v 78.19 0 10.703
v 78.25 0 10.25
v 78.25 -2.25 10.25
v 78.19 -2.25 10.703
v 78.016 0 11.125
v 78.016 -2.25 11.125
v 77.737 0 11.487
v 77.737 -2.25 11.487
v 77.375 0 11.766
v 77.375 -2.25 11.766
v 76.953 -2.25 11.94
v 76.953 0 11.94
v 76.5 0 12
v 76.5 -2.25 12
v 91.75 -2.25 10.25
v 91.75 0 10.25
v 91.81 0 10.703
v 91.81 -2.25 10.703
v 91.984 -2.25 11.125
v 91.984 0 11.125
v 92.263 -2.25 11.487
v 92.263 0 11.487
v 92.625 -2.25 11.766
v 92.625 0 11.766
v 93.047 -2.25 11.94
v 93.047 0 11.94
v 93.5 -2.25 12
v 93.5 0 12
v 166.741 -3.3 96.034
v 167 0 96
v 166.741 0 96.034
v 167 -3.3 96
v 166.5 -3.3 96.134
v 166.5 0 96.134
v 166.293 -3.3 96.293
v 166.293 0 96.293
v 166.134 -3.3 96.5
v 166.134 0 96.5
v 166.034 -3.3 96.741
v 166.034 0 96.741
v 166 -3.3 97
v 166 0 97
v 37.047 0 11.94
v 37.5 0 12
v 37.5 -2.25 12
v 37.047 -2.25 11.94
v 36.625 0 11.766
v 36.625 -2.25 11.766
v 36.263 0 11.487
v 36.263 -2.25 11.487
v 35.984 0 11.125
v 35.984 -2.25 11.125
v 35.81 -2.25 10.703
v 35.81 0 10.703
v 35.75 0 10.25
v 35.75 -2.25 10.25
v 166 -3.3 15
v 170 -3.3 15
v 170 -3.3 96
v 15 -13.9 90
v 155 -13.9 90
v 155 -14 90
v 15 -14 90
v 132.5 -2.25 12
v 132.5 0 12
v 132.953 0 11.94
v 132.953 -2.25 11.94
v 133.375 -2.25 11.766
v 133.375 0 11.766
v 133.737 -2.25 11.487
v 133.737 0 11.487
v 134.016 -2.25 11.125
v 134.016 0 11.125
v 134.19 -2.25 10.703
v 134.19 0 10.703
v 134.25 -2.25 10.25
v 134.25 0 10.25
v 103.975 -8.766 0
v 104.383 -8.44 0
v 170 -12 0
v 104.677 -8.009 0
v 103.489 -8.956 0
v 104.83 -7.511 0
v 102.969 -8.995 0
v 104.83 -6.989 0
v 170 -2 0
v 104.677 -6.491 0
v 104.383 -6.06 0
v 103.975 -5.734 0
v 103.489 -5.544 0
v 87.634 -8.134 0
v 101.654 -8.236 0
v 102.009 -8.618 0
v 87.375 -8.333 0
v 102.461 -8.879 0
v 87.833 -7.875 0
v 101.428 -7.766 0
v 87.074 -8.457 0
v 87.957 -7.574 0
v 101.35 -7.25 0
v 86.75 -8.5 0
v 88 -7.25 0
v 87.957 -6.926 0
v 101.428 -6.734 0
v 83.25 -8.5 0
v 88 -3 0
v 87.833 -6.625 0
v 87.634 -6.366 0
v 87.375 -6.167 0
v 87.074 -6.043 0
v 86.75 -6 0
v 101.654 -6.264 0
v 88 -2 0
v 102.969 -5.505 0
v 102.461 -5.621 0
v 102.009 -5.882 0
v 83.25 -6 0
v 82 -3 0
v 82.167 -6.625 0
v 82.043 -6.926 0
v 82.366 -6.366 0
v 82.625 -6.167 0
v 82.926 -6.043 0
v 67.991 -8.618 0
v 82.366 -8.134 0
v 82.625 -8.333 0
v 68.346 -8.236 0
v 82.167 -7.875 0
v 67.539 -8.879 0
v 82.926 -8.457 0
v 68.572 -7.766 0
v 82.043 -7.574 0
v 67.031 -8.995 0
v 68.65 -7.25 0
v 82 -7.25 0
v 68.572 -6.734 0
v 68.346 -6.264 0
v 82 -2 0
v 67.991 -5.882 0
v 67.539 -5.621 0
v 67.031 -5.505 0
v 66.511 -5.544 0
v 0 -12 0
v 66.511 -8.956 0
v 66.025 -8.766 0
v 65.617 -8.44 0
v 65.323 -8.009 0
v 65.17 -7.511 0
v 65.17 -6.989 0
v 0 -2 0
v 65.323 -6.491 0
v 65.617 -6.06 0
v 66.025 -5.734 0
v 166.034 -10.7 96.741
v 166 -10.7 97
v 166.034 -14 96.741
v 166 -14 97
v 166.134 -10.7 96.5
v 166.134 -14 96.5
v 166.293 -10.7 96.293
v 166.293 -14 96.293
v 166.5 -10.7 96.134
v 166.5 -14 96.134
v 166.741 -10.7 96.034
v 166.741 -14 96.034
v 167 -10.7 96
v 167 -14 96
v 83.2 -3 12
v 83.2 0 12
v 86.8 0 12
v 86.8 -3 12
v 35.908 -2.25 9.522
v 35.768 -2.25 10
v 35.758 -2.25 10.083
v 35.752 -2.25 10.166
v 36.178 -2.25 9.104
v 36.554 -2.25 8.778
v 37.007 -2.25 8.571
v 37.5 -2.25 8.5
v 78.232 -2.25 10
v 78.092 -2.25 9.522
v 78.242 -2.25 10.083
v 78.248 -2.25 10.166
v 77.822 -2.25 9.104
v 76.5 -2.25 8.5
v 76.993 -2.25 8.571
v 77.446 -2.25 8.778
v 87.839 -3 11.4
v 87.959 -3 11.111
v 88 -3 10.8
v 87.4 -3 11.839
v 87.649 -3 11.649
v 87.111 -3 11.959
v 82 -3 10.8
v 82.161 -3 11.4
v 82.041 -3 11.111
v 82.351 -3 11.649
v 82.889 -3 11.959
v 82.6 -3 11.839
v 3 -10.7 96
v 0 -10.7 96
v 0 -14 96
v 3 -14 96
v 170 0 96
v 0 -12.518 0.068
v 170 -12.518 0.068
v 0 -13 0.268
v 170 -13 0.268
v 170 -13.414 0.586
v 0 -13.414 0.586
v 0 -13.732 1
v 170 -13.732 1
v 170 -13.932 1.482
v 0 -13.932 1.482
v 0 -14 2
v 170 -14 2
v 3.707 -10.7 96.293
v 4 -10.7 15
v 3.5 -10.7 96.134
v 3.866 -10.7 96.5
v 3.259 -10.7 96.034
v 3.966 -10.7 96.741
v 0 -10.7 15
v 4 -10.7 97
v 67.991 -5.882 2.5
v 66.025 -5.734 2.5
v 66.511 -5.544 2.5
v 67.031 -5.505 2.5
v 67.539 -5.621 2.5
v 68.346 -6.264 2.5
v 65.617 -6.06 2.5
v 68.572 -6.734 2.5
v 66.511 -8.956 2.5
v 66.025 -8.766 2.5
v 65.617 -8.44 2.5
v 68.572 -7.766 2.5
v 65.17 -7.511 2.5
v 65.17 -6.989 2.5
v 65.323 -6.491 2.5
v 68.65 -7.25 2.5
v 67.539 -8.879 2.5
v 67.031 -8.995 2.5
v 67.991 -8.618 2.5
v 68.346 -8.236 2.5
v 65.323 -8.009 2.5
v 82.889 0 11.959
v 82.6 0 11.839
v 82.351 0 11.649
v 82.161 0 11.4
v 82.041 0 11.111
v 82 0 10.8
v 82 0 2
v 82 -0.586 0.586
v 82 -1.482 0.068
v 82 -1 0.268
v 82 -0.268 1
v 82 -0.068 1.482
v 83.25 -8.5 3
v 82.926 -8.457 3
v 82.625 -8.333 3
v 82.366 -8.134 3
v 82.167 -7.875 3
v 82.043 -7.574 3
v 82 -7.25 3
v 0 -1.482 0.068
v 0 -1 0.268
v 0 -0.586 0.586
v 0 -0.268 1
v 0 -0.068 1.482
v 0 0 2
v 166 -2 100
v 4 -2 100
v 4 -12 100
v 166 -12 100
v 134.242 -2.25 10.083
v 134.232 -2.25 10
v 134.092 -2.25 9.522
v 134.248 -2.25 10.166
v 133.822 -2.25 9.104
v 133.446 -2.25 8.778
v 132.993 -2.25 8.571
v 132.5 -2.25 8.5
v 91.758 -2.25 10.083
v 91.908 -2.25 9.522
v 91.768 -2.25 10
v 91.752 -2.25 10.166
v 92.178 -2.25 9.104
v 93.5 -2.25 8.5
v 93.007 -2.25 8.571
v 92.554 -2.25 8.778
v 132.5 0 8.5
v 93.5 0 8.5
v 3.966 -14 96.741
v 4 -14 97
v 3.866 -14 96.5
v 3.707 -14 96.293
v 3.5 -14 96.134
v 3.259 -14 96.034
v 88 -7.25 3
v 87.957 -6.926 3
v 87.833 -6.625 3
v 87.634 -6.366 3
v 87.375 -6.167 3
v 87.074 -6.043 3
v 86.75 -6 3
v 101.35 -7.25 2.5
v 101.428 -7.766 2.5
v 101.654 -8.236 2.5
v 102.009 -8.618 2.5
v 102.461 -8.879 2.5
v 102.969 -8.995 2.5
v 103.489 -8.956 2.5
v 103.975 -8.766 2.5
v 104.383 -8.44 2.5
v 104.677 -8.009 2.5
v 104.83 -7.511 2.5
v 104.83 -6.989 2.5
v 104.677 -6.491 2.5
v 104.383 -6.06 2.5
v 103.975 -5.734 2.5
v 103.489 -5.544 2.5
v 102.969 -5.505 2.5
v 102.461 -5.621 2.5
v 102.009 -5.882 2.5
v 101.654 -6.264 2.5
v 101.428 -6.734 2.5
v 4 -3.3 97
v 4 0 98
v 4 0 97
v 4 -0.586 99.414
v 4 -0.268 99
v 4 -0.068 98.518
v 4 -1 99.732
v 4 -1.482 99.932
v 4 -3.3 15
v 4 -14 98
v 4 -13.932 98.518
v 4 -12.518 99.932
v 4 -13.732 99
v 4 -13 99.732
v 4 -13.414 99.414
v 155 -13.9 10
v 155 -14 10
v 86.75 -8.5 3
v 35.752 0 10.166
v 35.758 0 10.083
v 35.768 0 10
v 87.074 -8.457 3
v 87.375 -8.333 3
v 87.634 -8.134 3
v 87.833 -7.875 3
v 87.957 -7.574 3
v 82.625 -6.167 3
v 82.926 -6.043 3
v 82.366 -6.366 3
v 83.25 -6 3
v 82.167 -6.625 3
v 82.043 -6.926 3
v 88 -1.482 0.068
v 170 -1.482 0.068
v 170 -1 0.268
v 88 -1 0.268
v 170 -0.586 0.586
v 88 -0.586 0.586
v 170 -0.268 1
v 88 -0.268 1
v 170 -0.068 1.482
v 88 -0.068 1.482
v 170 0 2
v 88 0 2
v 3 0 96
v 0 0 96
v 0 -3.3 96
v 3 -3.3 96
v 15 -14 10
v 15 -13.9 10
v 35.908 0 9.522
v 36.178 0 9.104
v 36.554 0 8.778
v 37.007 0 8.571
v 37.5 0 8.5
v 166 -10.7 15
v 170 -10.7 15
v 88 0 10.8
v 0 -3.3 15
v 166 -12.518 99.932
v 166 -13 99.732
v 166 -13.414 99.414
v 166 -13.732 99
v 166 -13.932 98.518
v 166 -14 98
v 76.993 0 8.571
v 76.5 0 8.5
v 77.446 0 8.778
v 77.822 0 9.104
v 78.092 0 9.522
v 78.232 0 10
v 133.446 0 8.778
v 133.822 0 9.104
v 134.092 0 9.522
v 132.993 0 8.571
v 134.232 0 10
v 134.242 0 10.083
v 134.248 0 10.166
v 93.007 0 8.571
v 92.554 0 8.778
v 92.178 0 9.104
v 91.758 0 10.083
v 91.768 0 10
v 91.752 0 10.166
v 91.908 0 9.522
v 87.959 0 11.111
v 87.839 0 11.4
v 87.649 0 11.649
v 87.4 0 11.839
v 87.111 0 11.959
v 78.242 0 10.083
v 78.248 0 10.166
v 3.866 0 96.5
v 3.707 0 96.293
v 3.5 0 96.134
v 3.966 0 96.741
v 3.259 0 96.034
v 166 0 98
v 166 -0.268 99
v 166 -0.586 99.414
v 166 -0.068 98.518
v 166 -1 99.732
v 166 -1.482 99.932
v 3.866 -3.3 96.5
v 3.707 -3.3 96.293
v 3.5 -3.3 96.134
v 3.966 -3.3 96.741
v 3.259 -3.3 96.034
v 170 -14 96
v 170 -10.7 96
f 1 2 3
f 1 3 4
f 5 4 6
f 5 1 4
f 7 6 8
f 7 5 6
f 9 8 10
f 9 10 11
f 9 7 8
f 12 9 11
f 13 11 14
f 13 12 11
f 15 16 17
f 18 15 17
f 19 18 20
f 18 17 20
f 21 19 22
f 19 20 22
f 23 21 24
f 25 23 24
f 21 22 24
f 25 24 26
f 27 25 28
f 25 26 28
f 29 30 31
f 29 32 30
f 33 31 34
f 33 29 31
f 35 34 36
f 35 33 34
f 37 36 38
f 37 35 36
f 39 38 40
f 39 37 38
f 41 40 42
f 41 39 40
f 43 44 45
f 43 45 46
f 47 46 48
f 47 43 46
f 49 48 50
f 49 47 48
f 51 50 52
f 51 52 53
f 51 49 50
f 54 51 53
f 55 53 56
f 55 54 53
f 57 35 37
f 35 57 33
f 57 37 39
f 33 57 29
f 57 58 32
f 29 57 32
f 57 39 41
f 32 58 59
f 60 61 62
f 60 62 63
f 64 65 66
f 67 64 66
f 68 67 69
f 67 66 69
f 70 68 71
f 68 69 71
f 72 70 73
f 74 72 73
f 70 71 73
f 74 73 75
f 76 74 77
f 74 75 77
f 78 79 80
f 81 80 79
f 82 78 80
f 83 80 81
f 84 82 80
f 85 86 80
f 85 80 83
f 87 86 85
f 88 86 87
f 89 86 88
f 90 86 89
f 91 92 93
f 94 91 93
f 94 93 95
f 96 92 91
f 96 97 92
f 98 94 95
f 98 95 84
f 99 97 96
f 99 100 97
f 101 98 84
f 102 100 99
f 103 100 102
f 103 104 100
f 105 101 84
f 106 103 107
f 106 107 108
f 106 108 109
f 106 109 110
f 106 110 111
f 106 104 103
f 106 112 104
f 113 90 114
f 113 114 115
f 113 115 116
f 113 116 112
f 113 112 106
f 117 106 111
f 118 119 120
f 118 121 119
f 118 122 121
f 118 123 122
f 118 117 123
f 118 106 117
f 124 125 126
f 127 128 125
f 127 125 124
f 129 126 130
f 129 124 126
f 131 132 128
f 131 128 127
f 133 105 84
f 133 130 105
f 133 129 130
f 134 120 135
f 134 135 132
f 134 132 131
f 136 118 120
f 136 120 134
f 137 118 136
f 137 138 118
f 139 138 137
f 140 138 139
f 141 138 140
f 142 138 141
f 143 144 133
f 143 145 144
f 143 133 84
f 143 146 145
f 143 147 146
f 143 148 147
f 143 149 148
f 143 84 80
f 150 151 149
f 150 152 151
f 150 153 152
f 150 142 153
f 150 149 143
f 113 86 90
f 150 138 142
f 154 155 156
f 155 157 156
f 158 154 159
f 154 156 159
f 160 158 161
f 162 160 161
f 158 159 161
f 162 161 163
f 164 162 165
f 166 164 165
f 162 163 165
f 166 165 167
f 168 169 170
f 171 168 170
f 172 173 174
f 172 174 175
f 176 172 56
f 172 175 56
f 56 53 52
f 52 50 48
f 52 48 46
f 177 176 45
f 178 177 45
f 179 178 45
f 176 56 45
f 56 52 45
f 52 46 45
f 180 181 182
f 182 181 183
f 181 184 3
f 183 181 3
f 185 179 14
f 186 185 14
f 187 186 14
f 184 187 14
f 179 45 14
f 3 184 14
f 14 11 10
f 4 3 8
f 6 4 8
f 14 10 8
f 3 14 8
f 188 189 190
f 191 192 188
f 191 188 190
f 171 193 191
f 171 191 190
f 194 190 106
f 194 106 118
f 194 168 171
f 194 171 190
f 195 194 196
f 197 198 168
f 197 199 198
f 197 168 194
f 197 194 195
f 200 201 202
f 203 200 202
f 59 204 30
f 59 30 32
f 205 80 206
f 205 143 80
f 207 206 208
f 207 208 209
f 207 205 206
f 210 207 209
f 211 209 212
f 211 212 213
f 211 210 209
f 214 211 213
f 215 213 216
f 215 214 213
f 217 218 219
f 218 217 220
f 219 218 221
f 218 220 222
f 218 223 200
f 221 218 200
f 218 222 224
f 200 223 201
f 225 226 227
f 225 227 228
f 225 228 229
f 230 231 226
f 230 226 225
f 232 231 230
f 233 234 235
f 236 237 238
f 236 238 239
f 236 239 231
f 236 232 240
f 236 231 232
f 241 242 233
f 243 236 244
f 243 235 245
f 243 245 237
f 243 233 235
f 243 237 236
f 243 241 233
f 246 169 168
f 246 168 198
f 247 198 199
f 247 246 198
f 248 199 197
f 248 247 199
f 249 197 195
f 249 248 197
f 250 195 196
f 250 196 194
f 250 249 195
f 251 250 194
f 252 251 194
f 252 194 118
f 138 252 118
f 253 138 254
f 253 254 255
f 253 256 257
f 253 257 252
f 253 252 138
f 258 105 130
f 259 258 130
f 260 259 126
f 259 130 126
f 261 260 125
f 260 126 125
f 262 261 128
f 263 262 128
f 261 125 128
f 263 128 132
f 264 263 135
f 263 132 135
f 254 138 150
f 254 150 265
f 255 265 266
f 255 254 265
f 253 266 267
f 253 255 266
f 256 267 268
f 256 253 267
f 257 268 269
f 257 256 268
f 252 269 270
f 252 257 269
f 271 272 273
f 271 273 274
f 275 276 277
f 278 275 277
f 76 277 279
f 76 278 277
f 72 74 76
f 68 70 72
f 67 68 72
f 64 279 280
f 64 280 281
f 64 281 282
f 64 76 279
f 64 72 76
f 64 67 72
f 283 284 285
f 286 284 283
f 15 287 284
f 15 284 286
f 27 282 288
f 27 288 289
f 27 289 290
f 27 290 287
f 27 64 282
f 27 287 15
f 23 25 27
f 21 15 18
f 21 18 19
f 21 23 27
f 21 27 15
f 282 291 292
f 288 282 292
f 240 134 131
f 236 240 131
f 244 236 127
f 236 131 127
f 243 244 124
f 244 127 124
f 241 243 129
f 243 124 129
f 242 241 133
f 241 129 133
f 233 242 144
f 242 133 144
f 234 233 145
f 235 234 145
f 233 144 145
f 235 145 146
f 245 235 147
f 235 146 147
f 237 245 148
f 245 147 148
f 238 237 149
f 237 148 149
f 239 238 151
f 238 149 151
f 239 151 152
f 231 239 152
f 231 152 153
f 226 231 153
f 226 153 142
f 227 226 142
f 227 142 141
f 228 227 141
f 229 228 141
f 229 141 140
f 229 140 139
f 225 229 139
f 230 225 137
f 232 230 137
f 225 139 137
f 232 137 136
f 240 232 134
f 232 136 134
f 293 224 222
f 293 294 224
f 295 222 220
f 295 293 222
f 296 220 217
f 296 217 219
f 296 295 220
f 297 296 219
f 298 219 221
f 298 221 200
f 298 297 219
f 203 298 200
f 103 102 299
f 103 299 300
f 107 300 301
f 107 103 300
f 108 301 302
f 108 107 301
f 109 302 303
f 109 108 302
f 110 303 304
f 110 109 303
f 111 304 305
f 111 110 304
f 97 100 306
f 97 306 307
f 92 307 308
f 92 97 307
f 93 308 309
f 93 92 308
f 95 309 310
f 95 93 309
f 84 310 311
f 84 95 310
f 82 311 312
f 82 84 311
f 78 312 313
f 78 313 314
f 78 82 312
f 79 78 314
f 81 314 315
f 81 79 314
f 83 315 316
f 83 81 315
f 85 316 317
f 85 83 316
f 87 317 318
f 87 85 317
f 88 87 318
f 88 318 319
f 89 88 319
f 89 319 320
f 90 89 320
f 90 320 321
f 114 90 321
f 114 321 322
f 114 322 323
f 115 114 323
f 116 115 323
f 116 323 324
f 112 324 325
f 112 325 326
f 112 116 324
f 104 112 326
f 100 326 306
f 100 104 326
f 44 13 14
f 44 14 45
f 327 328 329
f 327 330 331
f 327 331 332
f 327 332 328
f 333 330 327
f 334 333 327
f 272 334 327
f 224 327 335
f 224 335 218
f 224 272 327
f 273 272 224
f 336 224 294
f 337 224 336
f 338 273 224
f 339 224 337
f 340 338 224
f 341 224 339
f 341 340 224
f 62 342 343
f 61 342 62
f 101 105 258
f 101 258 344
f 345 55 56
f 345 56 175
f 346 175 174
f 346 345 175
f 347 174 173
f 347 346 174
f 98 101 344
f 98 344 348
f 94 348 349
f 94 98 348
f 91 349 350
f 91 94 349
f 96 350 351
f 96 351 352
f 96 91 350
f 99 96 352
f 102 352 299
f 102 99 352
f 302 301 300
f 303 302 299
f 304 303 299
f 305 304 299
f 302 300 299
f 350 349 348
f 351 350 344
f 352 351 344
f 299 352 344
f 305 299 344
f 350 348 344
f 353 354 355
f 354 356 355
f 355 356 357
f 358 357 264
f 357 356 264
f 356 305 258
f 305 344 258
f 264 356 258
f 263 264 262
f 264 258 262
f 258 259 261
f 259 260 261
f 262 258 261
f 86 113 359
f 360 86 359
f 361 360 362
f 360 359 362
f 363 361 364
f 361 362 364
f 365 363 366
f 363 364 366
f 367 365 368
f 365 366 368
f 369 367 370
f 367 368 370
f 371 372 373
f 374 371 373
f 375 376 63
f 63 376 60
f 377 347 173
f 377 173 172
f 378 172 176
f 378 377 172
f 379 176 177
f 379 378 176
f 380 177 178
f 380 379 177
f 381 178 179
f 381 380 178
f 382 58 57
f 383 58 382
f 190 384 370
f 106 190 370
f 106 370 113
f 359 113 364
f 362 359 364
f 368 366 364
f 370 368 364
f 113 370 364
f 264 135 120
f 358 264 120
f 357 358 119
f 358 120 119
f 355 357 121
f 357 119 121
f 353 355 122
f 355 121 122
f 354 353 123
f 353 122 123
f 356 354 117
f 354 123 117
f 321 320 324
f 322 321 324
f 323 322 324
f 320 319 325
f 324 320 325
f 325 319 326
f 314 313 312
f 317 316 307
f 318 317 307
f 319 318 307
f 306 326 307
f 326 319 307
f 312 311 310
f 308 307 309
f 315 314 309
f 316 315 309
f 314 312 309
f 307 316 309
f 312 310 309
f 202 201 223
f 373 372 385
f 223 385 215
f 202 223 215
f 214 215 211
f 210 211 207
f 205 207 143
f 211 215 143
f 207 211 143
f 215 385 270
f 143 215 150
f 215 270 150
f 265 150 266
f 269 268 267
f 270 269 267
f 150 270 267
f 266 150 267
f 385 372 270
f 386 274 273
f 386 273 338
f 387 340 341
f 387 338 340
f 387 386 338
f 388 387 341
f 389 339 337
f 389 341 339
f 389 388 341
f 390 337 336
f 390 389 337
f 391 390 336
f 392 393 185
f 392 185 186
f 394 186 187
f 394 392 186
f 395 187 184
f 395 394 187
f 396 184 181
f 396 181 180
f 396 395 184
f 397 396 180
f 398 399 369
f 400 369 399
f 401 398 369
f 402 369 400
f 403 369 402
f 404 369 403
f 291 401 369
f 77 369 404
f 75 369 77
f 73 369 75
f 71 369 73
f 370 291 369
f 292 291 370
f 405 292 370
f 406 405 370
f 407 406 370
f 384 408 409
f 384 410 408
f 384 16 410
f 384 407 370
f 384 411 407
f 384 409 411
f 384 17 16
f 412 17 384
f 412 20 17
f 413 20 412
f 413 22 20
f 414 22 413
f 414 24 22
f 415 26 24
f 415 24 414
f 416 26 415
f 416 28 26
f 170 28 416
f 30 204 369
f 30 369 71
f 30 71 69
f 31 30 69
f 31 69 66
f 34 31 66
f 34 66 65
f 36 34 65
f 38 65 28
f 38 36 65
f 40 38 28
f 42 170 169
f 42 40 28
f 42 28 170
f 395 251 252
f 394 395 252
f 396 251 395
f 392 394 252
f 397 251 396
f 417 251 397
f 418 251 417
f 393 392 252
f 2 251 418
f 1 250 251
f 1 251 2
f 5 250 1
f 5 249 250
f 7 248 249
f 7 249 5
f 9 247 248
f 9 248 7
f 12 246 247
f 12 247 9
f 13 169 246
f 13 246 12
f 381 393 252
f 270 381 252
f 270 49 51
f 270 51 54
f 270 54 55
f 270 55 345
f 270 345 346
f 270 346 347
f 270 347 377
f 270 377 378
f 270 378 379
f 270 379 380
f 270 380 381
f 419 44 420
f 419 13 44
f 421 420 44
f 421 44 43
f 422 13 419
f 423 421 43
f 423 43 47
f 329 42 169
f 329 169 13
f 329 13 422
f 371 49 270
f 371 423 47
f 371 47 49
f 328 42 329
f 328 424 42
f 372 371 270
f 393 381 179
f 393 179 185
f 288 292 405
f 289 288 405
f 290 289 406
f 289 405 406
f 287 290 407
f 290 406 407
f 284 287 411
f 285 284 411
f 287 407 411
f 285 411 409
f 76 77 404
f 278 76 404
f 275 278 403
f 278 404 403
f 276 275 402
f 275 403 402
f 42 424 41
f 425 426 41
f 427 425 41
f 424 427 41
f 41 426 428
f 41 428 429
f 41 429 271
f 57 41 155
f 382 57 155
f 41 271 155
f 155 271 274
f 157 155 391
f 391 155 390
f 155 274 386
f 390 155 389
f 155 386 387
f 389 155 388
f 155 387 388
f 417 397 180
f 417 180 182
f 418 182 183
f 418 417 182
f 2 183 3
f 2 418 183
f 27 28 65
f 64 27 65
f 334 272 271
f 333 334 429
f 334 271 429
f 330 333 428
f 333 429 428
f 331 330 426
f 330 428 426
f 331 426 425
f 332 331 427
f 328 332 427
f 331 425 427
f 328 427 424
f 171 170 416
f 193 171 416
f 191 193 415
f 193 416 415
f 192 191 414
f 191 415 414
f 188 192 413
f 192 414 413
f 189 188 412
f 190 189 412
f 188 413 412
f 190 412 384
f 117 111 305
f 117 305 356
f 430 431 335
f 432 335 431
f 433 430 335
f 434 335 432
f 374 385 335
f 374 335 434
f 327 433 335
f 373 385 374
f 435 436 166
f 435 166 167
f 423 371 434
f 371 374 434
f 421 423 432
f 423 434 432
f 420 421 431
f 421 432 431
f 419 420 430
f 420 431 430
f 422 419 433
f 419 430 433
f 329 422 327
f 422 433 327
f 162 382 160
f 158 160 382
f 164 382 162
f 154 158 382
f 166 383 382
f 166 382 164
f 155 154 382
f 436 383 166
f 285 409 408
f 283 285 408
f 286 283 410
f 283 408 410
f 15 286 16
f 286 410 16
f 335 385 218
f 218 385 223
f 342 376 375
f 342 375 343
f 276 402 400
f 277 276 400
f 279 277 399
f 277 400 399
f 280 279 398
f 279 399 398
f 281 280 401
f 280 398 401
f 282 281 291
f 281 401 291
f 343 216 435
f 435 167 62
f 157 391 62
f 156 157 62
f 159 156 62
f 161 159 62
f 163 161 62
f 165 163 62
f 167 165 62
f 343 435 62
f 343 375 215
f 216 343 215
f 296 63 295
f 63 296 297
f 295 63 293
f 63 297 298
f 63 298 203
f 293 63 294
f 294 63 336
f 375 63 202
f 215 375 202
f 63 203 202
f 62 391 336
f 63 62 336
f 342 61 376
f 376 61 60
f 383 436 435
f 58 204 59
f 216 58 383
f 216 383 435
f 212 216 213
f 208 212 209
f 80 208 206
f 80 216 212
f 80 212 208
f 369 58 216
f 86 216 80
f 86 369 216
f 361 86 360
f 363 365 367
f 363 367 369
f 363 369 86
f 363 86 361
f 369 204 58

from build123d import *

# Parameters (mm, degrees)
F1_DEPTH  = 14
F2_R      = 2
F0_W      = 70
F0_H      = 80
F3_DEPTH  = 13.9
F4_W      = 7.4
F4_H      = 4
F4_H_2    = 81
F5_DEPTH  = 4
F6_R      = 1
F7_W      = 3
F7_H      = 10
F8_DEPTH  = 3
F9_DEPTH  = 2.25
F11_DEPTH = 3
F10_R     = 1.75
F12_DEPTH = 2.5


with BuildPart() as f1:
    # F0 (on Front) → F1 (new body)
    with BuildSketch(Plane.XZ):
        Polygon((0, 100), (0, 0), (85, 0), (85, 10), (15, 10), (15, 90), (85, 90), (85, 100), align=None)
    extrude(amount=F1_DEPTH)

    # F2
    f2_edges = [f1.edges().sort_by_distance(p)[0] for p in [
        (42.5, -14, 100),
        (42.5, 0, 100),
        (42.5, -14, 0),
        (42.5, 0, 0),
    ]]
    fillet(f2_edges, radius=F2_R)

    # F0 (on Front) → F3 (join)
    with BuildSketch(Plane.XZ):
        with Locations((50, 50)):
            Rectangle(F0_W, F0_H)
    extrude(amount=F3_DEPTH)

    # F4 (on face) → F5 (cut)
    with BuildSketch(Plane(origin=(0, 0, 0), x_dir=(0, -1, 0), z_dir=(-1, 0, 0))):
        with BuildLine():
            Line((12, 100), (10.7, 100))
            Line((10.7, 100), (10.7, 96))
            Line((10.7, 96), (14, 96))
            Line((14, 96), (14, 98))
            ThreePointArc((14, 98), (13.4142135624, 99.4142135624), (12, 100))
        make_face()
        with Locations((7, 98)):
            Rectangle(F4_W, F4_H)
        with BuildLine():
            Line((3.3, 96), (3.3, 100))
            Line((3.3, 100), (2, 100))
            ThreePointArc((2, 100), (0.5857864376, 99.4142135624), (0, 98))
            Line((0, 98), (0, 96))
            Line((0, 96), (3.3, 96))
        make_face()
        with Locations((7, 55.5)):
            Rectangle(F4_W, F4_H_2)
    extrude(amount=-F5_DEPTH, mode=Mode.SUBTRACT)

    # F6
    f6_edges = [f1.edges().sort_by_distance(p)[0] for p in [
        (4, -1.65, 96),
        (4, -12.35, 96),
    ]]
    fillet(f6_edges, radius=F6_R)

    # F7 (on face) → F8 (cut)
    with BuildSketch(Plane.XZ):
        with BuildLine():
            Line((82, 10.8), (82, 10))
            Line((82, 10), (85, 10))
            Line((85, 10), (85, 12))
            Line((85, 12), (83.2, 12))
            ThreePointArc((83.2, 12), (82.3514718626, 11.6485281374), (82, 10.8))
        make_face()
        with Locations((83.5, 5)):
            Rectangle(F7_W, F7_H)
    extrude(amount=F8_DEPTH, mode=Mode.SUBTRACT)

    # F7 (on face) → F9 (cut)
    with BuildSketch(Plane.XZ):
        with BuildLine():
            Line((35.7679491924, 10), (78.2320508076, 10))
            ThreePointArc((78.2320508076, 10), (78.245506934, 10.1246782406), (78.25, 10.25))
            ThreePointArc((78.25, 10.25), (77.7374368671, 11.4874368671), (76.5, 12))
            Line((76.5, 12), (37.5, 12))
            ThreePointArc((37.5, 12), (36.2625631329, 11.4874368671), (35.75, 10.25))
            ThreePointArc((35.75, 10.25), (35.754493066, 10.1246782406), (35.7679491924, 10))
        make_face()
        with BuildLine():
            ThreePointArc((76.5, 8.5), (77.6456439237, 8.9271243445), (78.2320508076, 10))
            Line((78.2320508076, 10), (35.7679491924, 10))
            ThreePointArc((35.7679491924, 10), (36.3543560763, 8.9271243445), (37.5, 8.5))
            Line((37.5, 8.5), (76.5, 8.5))
        make_face()
    extrude(amount=F9_DEPTH, mode=Mode.SUBTRACT)

    # F10 (on face) → F11 (cut)
    with BuildSketch(Plane(origin=(0, 0, 0), x_dir=(1, 0, 0), z_dir=(0, 0, -1))):
        with BuildLine():
            Line((83.25, 6), (85, 6))
            Line((85, 6), (85, 8.5))
            Line((85, 8.5), (83.25, 8.5))
            ThreePointArc((83.25, 8.5), (82.3661165235, 8.1338834765), (82, 7.25))
            ThreePointArc((82, 7.25), (82.3661165235, 6.3661165235), (83.25, 6))
        make_face()
    extrude(amount=-F11_DEPTH, mode=Mode.SUBTRACT)

    # F10 (on face) → F12 (cut)
    with BuildSketch(Plane(origin=(0, 0, 0), x_dir=(1, 0, 0), z_dir=(0, 0, -1))):
        with Locations((66.9, 7.25)):
            Circle(F10_R)
    extrude(amount=-F12_DEPTH, mode=Mode.SUBTRACT)

    # F13: F1 across face


with BuildPart() as f1_1:
    add(f1.part)
    add(f1.part.mirror(Plane(origin=(85, -7.100228209, 51.4155420461), x_dir=(0, 1, 0), z_dir=(1, 0, 0))))


solid = f1_1.part
